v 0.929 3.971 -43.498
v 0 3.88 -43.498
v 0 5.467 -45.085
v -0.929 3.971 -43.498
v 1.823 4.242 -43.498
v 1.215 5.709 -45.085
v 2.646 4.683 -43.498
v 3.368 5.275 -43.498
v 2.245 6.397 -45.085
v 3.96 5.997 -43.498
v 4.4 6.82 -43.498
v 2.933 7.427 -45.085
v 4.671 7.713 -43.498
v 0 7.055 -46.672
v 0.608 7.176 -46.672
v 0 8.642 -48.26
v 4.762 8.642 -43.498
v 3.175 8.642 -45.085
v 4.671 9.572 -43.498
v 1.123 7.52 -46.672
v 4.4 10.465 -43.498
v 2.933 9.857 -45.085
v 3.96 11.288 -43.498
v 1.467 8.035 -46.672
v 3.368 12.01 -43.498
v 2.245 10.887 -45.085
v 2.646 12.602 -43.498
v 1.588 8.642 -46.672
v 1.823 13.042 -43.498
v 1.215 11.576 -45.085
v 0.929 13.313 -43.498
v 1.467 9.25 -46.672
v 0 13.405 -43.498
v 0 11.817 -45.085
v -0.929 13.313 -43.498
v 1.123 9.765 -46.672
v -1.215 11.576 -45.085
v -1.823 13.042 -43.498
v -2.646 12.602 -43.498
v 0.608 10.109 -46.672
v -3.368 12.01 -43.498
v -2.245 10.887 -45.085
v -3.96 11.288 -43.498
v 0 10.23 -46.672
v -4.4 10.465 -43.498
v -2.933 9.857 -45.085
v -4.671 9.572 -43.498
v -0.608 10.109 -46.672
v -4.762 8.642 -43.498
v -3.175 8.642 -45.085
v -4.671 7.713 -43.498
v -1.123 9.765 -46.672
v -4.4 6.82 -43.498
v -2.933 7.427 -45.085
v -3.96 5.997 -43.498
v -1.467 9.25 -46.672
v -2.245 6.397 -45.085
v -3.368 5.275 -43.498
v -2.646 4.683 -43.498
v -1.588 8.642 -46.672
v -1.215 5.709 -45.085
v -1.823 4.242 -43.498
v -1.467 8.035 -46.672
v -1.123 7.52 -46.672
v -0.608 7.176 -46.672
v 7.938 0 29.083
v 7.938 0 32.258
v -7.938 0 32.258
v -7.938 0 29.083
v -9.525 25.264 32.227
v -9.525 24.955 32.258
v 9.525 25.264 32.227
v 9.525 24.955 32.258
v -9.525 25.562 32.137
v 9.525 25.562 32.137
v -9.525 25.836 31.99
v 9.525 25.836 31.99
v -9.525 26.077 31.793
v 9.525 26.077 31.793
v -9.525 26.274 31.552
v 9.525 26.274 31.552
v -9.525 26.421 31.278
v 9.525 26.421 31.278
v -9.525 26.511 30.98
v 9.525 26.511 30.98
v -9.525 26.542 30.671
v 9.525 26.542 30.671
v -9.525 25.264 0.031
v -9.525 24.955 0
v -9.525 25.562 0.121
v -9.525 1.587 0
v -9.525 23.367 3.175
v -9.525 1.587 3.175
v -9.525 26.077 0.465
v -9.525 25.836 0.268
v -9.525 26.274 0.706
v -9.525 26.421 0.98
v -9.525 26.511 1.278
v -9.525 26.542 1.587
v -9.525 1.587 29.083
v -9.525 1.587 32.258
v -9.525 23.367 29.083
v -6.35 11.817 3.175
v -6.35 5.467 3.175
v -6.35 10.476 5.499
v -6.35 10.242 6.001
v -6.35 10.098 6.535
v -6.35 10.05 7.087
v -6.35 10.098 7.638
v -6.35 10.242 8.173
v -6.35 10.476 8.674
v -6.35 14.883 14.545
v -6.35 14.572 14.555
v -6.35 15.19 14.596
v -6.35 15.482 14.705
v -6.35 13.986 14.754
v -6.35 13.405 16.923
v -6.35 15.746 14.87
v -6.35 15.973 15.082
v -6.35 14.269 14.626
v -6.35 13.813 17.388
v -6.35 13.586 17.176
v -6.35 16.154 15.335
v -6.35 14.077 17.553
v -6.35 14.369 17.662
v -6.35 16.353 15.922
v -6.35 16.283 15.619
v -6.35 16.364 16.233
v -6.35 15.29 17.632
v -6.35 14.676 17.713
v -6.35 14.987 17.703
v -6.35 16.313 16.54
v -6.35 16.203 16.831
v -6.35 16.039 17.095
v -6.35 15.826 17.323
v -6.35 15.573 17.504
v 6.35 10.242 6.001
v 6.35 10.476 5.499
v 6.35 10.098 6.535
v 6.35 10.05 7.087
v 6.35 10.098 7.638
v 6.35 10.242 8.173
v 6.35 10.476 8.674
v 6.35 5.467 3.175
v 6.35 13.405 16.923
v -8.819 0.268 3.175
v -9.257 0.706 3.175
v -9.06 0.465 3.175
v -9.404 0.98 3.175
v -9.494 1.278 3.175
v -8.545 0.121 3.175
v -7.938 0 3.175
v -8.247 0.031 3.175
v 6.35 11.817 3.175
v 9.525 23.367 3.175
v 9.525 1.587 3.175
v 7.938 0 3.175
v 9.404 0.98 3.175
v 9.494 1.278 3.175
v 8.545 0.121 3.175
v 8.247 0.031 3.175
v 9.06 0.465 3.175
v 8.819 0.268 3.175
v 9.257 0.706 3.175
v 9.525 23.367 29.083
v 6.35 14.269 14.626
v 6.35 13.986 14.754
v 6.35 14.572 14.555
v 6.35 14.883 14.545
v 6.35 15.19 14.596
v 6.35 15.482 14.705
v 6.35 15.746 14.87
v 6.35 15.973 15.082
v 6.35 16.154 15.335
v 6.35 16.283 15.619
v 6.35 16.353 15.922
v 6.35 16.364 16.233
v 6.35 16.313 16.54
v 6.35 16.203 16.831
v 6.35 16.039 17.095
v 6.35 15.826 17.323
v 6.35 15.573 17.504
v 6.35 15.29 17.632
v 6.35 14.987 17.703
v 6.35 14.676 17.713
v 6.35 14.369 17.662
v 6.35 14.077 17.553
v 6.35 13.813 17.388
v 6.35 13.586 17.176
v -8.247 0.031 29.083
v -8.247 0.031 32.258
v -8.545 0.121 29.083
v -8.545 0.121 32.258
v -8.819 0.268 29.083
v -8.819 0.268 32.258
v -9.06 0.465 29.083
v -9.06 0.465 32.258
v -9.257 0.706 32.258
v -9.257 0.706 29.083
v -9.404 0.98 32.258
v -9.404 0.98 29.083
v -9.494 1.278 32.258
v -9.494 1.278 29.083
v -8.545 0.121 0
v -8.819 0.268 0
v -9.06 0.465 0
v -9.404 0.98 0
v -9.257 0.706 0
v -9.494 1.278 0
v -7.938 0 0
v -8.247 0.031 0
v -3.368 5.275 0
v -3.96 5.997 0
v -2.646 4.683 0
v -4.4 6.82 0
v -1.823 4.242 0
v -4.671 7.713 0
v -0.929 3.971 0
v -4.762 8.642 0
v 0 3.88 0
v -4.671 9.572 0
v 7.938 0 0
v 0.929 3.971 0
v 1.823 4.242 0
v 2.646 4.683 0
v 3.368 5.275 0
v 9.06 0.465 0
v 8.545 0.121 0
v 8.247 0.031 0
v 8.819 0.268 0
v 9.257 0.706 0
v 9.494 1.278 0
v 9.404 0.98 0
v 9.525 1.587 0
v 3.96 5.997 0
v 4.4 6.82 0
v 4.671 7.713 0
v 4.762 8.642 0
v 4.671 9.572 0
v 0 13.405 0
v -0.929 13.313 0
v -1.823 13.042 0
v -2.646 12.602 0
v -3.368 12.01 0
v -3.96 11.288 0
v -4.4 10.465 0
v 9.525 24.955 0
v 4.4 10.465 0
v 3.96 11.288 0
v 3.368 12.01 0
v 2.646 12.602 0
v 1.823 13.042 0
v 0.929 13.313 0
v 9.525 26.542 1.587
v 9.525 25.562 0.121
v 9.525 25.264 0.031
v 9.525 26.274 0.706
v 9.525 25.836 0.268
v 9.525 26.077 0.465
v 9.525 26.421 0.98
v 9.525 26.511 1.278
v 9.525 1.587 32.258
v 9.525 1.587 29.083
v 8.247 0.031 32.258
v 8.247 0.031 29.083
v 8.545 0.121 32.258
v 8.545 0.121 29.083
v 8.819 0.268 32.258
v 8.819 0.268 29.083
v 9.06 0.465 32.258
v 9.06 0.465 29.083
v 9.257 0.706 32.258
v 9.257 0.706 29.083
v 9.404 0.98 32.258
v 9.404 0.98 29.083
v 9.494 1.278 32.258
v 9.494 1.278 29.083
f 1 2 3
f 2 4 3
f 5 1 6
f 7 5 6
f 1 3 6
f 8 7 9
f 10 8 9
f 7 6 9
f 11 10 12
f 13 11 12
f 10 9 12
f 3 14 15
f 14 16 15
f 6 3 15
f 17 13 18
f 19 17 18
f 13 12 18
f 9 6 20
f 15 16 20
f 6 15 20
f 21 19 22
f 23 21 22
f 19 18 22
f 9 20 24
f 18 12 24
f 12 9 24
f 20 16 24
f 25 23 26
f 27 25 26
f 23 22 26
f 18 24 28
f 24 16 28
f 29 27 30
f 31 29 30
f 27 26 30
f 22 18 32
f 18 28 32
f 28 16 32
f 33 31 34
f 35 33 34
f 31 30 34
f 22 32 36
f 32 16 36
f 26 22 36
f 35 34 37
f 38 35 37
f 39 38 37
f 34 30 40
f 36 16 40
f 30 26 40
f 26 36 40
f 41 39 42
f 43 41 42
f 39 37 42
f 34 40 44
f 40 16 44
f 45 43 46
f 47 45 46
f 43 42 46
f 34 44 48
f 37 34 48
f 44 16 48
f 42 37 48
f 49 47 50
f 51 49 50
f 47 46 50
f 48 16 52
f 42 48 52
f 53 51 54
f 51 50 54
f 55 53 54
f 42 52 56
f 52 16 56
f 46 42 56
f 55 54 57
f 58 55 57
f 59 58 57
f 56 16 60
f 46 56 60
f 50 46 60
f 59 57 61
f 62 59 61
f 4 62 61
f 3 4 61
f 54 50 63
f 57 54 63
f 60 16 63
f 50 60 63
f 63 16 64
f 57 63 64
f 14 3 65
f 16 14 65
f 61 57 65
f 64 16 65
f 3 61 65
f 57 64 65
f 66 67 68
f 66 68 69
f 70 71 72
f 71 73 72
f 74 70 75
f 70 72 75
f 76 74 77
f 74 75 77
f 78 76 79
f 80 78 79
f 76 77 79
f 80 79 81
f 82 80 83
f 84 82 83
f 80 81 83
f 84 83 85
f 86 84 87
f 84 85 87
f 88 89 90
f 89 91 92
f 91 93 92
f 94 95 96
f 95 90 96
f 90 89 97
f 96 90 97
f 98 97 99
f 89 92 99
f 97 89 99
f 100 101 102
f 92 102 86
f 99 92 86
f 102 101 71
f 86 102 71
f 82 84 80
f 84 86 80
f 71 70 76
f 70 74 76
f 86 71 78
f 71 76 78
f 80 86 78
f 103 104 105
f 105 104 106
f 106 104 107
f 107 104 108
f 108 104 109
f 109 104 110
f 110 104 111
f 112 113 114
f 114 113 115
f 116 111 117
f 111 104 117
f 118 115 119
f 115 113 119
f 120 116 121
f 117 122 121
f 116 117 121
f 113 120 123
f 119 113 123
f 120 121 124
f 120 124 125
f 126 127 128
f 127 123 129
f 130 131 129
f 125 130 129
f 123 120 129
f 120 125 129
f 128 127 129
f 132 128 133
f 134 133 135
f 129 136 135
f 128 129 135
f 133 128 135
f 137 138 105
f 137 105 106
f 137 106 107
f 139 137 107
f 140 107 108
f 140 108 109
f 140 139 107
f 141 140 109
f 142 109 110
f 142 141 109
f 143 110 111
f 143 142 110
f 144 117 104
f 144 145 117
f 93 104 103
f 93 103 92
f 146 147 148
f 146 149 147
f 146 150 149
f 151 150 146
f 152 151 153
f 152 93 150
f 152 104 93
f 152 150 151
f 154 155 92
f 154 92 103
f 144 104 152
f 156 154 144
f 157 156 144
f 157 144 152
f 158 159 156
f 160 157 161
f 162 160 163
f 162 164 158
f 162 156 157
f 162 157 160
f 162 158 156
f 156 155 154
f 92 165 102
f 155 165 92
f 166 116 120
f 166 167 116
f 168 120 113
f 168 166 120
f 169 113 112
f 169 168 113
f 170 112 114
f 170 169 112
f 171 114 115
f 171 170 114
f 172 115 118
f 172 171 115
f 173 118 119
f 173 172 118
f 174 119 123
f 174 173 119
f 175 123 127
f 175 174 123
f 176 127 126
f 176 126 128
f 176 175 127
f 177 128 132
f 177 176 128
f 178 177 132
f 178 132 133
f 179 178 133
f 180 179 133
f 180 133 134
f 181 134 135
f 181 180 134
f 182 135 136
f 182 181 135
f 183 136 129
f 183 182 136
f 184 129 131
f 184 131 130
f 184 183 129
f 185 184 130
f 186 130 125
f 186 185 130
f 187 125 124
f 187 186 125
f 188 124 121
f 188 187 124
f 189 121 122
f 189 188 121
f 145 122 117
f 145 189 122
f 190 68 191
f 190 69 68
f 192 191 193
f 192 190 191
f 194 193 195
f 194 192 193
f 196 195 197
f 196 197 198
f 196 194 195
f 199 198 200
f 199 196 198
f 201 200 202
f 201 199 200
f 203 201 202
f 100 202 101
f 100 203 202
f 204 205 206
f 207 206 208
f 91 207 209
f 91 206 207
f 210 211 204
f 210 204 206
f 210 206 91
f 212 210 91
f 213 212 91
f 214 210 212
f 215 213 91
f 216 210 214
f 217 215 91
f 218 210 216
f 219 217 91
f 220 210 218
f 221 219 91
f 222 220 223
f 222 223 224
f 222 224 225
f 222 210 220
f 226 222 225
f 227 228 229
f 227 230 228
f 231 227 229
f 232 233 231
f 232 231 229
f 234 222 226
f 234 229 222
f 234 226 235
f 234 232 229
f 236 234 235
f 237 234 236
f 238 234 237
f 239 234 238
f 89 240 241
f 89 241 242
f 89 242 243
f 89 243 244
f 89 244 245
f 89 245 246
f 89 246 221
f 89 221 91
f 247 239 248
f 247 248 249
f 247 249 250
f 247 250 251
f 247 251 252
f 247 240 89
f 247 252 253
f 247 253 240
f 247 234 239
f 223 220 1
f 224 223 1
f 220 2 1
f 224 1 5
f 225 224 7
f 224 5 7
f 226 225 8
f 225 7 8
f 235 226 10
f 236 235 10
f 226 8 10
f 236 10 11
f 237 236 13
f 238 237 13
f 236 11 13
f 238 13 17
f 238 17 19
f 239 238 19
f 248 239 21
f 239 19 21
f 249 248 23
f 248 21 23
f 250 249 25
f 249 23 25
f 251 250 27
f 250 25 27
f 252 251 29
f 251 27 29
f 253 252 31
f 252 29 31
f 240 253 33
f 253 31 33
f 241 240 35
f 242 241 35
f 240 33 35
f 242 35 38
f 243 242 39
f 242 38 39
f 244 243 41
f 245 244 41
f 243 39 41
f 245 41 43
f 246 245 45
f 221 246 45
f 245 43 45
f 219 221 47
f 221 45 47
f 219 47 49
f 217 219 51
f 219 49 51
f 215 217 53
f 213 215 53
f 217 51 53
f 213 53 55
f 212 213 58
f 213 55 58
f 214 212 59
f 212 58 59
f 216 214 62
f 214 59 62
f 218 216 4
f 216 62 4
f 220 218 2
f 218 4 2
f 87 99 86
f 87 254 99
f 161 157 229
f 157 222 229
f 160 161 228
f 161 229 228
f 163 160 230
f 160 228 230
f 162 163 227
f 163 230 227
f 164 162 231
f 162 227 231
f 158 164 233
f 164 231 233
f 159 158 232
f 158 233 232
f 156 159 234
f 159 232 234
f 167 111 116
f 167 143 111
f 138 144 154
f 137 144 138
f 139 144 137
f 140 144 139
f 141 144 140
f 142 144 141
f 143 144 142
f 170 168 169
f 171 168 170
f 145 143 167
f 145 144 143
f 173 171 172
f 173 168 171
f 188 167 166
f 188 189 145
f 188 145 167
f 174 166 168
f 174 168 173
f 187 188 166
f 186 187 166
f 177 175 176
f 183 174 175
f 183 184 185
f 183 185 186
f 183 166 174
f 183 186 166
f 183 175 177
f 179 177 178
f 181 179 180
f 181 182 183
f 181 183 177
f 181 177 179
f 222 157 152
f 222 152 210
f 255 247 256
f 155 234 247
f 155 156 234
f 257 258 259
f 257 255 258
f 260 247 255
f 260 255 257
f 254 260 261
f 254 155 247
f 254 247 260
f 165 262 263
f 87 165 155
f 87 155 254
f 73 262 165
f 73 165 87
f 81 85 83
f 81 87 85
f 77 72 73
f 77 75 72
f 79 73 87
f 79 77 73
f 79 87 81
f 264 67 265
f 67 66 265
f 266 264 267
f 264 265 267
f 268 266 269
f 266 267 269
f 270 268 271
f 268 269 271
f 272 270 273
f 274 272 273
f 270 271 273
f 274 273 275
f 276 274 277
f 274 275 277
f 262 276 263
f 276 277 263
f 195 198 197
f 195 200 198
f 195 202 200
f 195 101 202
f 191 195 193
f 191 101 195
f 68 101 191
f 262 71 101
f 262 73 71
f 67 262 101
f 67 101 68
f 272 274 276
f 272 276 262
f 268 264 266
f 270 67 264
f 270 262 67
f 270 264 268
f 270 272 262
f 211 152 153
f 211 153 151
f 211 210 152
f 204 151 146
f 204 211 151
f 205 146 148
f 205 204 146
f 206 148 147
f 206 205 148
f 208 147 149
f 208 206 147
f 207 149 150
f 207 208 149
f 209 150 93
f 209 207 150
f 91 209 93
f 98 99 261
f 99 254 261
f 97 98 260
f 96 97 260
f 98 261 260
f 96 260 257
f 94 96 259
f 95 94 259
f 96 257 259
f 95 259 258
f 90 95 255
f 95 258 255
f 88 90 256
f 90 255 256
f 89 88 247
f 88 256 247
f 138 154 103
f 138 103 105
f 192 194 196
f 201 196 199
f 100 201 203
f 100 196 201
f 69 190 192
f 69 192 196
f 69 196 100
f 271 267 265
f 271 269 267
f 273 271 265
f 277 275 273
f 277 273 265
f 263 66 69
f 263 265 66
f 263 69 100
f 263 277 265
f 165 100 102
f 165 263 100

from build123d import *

# Parameters (mm, degrees)
F1_DEPTH = 9.525
F2_R     = 1.5875
F4_DEPTH = 6.35


with BuildPart() as f1:
    # F0 (on Right) → F1 (new body, symmetric)
    with BuildSketch(Plane.YZ):
        Polygon((0, 3.175), (0, 0), (26.542, 0), (26.542, 32.258), (0, 32.258), (0, 29.083), (23.367, 29.083), (23.367, 3.175), align=None)
    extrude(amount=F1_DEPTH, both=True)

    # F2
    f2_edges = [f1.edges().sort_by_distance(p)[0] for p in [
        (9.525, 0, 30.6705),
        (-9.525, 0, 30.6705),
        (-9.525, 0, 1.5875),
        (9.525, 0, 1.5875),
        (0, 26.542, 32.258),
        (0, 26.542, 0),
    ]]
    fillet(f2_edges, radius=F2_R)

    # F3 (on Right) → F4 (join, symmetric)
    with BuildSketch(Plane.YZ):
        with BuildLine():
            Line((13.404685, 16.92275), (5.467418, 3.175))
            Line((5.467418, 3.175), (11.817418, 3.175))
            Line((11.817418, 3.175), (10.475505, 5.499261))
            ThreePointArc((10.475505, 5.499261), (10.050135, 7.086761), (10.475505, 8.674261))
            Line((10.475505, 8.674261), (13.98575, 14.754185))
            ThreePointArc((13.98575, 14.754185), (16.312907, 16.539875), (13.404685, 16.92275))
        make_face()
    extrude(amount=F4_DEPTH, both=True)

    # F5 (on Right) → F6 (revolve)
    with BuildSketch(Plane.YZ):
        Polygon((8.642418, 0), (3.879918, 0), (3.879918, -43.4975), (8.642418, -48.26), align=None)
    revolve(axis=Axis((0, 8.642418, -24.13), (0, 0, 1)))


solid = f1.part
